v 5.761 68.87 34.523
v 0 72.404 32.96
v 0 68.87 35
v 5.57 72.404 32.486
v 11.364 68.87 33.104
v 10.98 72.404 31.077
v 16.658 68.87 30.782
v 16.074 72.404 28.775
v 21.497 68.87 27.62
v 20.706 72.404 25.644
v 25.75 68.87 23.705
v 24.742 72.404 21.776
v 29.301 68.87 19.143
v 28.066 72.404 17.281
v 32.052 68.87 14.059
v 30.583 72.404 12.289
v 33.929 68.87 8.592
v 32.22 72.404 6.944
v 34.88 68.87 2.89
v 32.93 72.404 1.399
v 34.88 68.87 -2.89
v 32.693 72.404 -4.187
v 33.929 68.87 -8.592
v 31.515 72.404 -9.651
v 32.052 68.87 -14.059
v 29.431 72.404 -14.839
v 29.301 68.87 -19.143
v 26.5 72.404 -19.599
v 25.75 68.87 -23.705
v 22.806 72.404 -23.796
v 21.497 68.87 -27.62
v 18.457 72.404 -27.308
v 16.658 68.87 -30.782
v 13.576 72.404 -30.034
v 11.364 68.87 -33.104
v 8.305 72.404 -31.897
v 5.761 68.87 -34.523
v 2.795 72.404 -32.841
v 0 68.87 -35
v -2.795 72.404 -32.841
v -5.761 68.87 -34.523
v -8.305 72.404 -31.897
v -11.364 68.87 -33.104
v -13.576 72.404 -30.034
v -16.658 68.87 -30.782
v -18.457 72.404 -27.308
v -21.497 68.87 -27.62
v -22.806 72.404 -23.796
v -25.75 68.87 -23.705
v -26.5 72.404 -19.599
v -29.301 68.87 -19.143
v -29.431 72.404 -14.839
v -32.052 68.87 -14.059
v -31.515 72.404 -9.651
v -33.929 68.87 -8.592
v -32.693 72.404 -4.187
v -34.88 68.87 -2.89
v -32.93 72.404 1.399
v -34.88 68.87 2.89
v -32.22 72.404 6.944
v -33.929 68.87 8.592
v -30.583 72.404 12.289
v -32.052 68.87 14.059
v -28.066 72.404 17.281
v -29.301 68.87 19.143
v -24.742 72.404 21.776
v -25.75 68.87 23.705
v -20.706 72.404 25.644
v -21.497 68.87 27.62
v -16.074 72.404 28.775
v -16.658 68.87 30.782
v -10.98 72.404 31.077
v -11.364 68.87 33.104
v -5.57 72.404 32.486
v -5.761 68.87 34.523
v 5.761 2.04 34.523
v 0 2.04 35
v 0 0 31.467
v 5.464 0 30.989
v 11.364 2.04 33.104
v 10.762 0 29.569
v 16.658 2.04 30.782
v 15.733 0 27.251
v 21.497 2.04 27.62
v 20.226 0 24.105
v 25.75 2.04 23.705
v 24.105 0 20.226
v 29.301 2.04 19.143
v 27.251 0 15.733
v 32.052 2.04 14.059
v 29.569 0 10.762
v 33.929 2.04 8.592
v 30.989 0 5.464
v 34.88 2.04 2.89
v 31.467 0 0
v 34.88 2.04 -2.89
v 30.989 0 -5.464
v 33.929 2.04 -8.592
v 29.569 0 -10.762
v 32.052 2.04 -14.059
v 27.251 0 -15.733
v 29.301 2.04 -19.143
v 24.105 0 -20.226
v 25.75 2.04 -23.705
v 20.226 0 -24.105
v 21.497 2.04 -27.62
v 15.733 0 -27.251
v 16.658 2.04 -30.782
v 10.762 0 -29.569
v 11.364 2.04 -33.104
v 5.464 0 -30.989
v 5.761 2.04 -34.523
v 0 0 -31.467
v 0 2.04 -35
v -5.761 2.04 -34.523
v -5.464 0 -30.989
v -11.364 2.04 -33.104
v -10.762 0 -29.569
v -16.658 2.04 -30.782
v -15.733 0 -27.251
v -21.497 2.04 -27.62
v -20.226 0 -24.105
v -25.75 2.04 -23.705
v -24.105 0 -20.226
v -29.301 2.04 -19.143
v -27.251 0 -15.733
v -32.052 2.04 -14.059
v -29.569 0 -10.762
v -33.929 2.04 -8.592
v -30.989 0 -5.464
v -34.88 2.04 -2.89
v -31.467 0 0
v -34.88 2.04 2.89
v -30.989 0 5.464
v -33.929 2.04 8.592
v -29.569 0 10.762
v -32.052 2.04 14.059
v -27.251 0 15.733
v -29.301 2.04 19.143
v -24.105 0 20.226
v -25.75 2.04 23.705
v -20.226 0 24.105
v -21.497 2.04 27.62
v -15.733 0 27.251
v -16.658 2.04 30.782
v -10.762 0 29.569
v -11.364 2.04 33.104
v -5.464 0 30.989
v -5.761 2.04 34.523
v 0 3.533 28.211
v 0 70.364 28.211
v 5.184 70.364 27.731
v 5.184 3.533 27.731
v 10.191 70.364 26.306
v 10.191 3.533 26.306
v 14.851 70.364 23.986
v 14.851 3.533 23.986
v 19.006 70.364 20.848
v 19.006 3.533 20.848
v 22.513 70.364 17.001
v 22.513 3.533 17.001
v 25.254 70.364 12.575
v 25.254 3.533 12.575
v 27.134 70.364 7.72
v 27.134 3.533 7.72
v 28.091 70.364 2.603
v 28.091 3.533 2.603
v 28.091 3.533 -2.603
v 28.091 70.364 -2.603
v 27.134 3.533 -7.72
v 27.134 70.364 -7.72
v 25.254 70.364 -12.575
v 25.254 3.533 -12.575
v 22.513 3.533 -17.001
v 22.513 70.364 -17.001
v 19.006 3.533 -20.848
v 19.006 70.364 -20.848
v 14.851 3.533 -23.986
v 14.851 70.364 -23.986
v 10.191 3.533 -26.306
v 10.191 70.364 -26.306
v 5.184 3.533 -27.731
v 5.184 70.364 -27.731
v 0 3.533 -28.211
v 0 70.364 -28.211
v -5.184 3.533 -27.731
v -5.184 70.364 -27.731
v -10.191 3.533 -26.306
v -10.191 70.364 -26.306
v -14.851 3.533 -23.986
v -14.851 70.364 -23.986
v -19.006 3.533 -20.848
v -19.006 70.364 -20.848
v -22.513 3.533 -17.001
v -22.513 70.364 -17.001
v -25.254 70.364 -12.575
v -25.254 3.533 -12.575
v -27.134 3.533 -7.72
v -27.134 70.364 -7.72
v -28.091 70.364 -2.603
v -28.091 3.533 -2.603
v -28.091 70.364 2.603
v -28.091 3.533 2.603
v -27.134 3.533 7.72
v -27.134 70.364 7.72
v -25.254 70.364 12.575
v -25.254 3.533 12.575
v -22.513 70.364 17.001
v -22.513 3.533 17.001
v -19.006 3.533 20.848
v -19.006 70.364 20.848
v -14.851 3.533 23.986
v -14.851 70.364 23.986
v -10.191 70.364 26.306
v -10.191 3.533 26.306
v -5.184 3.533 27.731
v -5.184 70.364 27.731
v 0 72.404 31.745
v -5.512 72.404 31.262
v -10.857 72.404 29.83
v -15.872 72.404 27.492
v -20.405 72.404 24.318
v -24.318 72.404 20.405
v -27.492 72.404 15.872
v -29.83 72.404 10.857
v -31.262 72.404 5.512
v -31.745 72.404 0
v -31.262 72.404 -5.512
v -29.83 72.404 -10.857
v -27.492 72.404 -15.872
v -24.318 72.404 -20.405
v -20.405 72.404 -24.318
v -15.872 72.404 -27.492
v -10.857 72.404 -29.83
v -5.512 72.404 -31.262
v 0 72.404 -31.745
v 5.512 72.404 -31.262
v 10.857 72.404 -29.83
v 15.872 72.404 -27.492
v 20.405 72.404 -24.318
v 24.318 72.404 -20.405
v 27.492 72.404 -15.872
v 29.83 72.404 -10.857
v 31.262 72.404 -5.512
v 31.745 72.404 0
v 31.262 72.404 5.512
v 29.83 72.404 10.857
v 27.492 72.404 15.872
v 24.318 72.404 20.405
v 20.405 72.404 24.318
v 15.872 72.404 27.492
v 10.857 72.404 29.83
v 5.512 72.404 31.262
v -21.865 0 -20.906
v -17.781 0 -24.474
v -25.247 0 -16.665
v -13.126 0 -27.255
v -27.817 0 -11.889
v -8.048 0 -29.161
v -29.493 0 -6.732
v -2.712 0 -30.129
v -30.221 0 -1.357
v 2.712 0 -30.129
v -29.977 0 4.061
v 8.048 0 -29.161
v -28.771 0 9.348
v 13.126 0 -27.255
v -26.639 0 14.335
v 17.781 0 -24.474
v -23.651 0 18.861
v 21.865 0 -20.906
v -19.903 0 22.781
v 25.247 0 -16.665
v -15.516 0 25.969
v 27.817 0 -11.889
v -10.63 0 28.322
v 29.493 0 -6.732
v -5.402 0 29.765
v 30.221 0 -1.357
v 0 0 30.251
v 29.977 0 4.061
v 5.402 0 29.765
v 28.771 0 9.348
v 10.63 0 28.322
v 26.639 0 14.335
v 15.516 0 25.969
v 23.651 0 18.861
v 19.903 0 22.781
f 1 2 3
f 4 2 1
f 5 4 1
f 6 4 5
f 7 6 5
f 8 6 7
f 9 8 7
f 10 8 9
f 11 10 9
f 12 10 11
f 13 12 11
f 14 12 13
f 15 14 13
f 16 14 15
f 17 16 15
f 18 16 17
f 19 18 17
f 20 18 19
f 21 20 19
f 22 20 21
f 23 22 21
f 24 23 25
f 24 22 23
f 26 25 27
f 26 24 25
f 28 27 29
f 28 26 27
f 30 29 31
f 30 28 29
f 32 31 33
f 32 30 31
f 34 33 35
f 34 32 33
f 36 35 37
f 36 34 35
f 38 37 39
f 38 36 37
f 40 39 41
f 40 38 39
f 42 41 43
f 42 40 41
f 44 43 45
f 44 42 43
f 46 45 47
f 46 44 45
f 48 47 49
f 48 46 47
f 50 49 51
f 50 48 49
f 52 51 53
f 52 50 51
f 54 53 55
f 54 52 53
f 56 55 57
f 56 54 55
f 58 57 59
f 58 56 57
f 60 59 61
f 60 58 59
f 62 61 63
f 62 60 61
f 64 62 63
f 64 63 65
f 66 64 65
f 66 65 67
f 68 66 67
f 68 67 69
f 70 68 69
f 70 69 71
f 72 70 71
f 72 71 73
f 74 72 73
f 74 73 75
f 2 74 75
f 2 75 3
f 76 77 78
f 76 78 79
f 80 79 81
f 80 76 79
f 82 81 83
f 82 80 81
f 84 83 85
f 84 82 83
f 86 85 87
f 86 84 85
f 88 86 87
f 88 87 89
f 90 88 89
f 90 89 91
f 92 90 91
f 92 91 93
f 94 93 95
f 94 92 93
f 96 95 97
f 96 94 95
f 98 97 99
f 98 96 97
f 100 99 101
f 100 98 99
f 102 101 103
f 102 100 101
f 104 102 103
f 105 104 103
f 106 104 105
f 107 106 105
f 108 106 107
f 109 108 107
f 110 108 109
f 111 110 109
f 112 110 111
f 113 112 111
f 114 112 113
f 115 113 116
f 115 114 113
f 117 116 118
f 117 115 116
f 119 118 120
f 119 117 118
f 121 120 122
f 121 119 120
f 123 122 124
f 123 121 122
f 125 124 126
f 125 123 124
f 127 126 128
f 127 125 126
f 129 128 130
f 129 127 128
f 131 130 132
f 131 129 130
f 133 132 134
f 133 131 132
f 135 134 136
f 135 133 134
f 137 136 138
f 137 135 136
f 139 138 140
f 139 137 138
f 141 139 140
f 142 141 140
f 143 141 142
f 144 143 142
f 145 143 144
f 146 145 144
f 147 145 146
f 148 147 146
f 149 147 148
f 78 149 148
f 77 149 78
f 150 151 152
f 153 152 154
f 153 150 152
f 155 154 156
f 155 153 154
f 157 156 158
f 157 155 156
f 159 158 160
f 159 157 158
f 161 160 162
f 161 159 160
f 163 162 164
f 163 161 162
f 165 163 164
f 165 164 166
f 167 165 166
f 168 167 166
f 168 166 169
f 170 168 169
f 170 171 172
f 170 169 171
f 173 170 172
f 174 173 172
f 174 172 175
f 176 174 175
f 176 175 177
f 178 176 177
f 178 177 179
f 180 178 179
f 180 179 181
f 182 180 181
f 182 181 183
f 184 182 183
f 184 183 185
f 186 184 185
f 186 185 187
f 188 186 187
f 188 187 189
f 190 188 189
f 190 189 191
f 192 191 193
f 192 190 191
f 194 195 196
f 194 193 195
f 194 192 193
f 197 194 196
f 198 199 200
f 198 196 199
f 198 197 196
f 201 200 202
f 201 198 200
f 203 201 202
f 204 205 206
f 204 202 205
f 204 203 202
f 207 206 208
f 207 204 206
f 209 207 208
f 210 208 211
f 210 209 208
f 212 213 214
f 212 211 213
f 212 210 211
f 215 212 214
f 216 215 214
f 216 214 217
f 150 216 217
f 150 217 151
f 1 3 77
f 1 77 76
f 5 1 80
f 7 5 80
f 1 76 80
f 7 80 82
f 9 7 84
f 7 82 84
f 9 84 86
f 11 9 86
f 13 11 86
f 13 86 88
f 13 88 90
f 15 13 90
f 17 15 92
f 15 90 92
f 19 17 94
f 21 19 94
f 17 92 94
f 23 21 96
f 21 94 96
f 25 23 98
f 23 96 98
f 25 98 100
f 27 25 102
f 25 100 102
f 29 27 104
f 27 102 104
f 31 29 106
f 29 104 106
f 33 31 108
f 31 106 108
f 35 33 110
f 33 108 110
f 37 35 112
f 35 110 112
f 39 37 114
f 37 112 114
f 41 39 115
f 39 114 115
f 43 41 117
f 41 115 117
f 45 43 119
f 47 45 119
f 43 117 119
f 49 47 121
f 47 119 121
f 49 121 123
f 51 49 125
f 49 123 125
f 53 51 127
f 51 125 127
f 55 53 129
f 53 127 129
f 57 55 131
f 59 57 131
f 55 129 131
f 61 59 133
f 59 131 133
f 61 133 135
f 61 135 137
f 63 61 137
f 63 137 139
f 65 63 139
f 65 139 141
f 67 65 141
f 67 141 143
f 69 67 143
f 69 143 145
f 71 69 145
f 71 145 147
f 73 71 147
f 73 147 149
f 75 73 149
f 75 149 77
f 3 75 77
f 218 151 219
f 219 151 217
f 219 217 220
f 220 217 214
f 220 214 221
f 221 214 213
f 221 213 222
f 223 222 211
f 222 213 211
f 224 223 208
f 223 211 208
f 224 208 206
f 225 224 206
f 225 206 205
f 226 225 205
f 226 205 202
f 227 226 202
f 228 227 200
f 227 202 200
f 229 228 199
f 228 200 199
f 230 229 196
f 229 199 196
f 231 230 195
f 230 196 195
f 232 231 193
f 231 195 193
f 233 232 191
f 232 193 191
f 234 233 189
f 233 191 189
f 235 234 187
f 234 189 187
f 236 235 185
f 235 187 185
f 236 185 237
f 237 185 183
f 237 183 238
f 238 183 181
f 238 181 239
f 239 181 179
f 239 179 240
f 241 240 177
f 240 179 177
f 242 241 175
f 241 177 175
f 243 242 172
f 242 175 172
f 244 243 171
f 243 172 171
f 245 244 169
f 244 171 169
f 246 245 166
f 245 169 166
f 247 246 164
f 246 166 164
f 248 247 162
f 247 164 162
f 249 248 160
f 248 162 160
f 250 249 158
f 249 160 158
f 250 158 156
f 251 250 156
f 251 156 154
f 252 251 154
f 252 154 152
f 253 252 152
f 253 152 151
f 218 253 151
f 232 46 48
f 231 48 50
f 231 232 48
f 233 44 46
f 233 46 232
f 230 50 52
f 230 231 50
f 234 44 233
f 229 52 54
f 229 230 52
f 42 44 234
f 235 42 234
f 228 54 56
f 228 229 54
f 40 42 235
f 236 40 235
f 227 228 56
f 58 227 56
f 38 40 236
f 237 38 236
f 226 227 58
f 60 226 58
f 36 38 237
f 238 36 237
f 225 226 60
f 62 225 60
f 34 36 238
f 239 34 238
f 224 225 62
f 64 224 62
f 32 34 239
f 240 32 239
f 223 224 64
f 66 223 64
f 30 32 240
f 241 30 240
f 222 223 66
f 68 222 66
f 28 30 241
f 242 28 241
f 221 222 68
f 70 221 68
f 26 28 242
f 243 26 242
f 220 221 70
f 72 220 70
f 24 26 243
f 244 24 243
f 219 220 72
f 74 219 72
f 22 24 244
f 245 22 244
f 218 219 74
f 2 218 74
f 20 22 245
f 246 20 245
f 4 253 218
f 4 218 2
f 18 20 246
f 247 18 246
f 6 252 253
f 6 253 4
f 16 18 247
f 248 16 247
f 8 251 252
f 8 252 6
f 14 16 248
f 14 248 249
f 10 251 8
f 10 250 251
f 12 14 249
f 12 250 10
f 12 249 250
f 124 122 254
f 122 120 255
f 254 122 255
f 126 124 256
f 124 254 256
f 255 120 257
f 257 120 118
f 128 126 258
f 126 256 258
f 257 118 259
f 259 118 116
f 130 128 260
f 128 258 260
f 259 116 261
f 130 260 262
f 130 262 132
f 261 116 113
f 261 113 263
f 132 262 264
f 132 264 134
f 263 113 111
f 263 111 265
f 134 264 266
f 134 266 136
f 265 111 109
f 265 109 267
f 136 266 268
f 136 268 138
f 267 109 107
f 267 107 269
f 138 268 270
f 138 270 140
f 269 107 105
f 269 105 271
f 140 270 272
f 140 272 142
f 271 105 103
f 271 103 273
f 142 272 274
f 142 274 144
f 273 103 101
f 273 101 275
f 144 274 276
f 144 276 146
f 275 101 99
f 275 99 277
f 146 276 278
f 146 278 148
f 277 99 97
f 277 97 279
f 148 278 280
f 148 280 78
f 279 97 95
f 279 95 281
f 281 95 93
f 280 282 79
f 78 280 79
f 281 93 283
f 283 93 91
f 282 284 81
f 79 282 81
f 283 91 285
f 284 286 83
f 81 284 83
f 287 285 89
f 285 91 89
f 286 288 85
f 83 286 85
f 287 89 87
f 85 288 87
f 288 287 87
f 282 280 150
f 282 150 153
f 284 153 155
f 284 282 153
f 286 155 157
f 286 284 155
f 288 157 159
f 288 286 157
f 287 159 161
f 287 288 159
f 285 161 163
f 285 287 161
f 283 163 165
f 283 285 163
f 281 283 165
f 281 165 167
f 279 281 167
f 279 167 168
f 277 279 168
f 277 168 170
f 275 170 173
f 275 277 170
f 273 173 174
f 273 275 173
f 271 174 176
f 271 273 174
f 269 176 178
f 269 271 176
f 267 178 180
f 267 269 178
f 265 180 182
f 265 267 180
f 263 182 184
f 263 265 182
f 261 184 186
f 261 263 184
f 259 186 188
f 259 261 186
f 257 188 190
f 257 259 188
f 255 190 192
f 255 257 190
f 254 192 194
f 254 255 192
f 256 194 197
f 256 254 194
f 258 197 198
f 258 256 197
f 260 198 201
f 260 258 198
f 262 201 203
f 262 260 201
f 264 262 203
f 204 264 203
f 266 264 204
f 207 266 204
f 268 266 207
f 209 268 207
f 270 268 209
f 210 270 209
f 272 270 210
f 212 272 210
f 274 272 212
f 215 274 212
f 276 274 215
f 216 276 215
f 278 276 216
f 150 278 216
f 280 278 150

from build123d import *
from OCP.BRepFilletAPI import BRepFilletAPI_MakeChamfer

# Parameters (mm, degrees)
SKETCH1_R           = 35
BOSS_EXTRUDE1_DEPTH = 72.403703457
SKETCH2_R           = 28.211303246
CUT_EXTRUDE1_DEPTH  = 88.705736838
CHAMFER1_SIZE       = 3.533288169
CHAMFER1_SIZE2      = 2.039944876


with BuildPart() as part:
    # Sketch1 → Boss-Extrude1 (new body)
    with BuildSketch(Plane(origin=(0, 0, 0), x_dir=(1, 0, 0), z_dir=(0, 1, 0))):
        Circle(SKETCH1_R)
    extrude(amount=BOSS_EXTRUDE1_DEPTH)

    # Sketch2 → Cut-Extrude1 (cut, through all)
    with BuildSketch(Plane(origin=(0, 0, 0), x_dir=(1, 0, 0), z_dir=(0, 1, 0))):
        Circle(SKETCH2_R)
    extrude(amount=CUT_EXTRUDE1_DEPTH, mode=Mode.SUBTRACT)

    # Chamfer1: one chamfer whose edges measure the first distance from different faces: ONE call of the kernel's chamfer builder (chamfer() names one face for all edges)
    chamfer1_edges_1 = [part.edges().sort_by_distance(p)[0] for p in [
        (-28.211303246, 72.403703457, 0),
    ]]
    chamfer1_side_1 = [part.faces().sort_by_distance(p)[0] for p in [
        (-34.010050506, 72.403703457, 0),
    ]]
    chamfer1_edges_2 = [part.edges().sort_by_distance(p)[0] for p in [
        (-28.211303246, 0, 0),
    ]]
    chamfer1_side_2 = [part.faces().sort_by_distance(p)[0] for p in [
        (-28.211303246, 36.201851729, 0),
    ]]
    chamfer1_edges_3 = [part.edges().sort_by_distance(p)[0] for p in [
        (-35, 0, 0),
    ]]
    chamfer1_side_3 = [part.faces().sort_by_distance(p)[0] for p in [
        (-34.010050506, 0, 0),
    ]]
    chamfer1_edges_4 = [part.edges().sort_by_distance(p)[0] for p in [
        (-35, 72.403703457, 0),
    ]]
    chamfer1_side_4 = [part.faces().sort_by_distance(p)[0] for p in [
        (-35, 36.201851729, 0),
    ]]
    chamfer1 = BRepFilletAPI_MakeChamfer(part.part.solid().wrapped)
    for e in chamfer1_edges_1:
        chamfer1.Add(CHAMFER1_SIZE, CHAMFER1_SIZE2, e.wrapped, chamfer1_side_1[0].wrapped)  # the first distance lies on this face
    for e in chamfer1_edges_2:
        chamfer1.Add(CHAMFER1_SIZE, CHAMFER1_SIZE2, e.wrapped, chamfer1_side_2[0].wrapped)  # the first distance lies on this face
    for e in chamfer1_edges_3:
        chamfer1.Add(CHAMFER1_SIZE, CHAMFER1_SIZE2, e.wrapped, chamfer1_side_3[0].wrapped)  # the first distance lies on this face
    for e in chamfer1_edges_4:
        chamfer1.Add(CHAMFER1_SIZE, CHAMFER1_SIZE2, e.wrapped, chamfer1_side_4[0].wrapped)  # the first distance lies on this face
    add(Compound.cast(chamfer1.Shape()), mode=Mode.REPLACE)


solid = part.part
